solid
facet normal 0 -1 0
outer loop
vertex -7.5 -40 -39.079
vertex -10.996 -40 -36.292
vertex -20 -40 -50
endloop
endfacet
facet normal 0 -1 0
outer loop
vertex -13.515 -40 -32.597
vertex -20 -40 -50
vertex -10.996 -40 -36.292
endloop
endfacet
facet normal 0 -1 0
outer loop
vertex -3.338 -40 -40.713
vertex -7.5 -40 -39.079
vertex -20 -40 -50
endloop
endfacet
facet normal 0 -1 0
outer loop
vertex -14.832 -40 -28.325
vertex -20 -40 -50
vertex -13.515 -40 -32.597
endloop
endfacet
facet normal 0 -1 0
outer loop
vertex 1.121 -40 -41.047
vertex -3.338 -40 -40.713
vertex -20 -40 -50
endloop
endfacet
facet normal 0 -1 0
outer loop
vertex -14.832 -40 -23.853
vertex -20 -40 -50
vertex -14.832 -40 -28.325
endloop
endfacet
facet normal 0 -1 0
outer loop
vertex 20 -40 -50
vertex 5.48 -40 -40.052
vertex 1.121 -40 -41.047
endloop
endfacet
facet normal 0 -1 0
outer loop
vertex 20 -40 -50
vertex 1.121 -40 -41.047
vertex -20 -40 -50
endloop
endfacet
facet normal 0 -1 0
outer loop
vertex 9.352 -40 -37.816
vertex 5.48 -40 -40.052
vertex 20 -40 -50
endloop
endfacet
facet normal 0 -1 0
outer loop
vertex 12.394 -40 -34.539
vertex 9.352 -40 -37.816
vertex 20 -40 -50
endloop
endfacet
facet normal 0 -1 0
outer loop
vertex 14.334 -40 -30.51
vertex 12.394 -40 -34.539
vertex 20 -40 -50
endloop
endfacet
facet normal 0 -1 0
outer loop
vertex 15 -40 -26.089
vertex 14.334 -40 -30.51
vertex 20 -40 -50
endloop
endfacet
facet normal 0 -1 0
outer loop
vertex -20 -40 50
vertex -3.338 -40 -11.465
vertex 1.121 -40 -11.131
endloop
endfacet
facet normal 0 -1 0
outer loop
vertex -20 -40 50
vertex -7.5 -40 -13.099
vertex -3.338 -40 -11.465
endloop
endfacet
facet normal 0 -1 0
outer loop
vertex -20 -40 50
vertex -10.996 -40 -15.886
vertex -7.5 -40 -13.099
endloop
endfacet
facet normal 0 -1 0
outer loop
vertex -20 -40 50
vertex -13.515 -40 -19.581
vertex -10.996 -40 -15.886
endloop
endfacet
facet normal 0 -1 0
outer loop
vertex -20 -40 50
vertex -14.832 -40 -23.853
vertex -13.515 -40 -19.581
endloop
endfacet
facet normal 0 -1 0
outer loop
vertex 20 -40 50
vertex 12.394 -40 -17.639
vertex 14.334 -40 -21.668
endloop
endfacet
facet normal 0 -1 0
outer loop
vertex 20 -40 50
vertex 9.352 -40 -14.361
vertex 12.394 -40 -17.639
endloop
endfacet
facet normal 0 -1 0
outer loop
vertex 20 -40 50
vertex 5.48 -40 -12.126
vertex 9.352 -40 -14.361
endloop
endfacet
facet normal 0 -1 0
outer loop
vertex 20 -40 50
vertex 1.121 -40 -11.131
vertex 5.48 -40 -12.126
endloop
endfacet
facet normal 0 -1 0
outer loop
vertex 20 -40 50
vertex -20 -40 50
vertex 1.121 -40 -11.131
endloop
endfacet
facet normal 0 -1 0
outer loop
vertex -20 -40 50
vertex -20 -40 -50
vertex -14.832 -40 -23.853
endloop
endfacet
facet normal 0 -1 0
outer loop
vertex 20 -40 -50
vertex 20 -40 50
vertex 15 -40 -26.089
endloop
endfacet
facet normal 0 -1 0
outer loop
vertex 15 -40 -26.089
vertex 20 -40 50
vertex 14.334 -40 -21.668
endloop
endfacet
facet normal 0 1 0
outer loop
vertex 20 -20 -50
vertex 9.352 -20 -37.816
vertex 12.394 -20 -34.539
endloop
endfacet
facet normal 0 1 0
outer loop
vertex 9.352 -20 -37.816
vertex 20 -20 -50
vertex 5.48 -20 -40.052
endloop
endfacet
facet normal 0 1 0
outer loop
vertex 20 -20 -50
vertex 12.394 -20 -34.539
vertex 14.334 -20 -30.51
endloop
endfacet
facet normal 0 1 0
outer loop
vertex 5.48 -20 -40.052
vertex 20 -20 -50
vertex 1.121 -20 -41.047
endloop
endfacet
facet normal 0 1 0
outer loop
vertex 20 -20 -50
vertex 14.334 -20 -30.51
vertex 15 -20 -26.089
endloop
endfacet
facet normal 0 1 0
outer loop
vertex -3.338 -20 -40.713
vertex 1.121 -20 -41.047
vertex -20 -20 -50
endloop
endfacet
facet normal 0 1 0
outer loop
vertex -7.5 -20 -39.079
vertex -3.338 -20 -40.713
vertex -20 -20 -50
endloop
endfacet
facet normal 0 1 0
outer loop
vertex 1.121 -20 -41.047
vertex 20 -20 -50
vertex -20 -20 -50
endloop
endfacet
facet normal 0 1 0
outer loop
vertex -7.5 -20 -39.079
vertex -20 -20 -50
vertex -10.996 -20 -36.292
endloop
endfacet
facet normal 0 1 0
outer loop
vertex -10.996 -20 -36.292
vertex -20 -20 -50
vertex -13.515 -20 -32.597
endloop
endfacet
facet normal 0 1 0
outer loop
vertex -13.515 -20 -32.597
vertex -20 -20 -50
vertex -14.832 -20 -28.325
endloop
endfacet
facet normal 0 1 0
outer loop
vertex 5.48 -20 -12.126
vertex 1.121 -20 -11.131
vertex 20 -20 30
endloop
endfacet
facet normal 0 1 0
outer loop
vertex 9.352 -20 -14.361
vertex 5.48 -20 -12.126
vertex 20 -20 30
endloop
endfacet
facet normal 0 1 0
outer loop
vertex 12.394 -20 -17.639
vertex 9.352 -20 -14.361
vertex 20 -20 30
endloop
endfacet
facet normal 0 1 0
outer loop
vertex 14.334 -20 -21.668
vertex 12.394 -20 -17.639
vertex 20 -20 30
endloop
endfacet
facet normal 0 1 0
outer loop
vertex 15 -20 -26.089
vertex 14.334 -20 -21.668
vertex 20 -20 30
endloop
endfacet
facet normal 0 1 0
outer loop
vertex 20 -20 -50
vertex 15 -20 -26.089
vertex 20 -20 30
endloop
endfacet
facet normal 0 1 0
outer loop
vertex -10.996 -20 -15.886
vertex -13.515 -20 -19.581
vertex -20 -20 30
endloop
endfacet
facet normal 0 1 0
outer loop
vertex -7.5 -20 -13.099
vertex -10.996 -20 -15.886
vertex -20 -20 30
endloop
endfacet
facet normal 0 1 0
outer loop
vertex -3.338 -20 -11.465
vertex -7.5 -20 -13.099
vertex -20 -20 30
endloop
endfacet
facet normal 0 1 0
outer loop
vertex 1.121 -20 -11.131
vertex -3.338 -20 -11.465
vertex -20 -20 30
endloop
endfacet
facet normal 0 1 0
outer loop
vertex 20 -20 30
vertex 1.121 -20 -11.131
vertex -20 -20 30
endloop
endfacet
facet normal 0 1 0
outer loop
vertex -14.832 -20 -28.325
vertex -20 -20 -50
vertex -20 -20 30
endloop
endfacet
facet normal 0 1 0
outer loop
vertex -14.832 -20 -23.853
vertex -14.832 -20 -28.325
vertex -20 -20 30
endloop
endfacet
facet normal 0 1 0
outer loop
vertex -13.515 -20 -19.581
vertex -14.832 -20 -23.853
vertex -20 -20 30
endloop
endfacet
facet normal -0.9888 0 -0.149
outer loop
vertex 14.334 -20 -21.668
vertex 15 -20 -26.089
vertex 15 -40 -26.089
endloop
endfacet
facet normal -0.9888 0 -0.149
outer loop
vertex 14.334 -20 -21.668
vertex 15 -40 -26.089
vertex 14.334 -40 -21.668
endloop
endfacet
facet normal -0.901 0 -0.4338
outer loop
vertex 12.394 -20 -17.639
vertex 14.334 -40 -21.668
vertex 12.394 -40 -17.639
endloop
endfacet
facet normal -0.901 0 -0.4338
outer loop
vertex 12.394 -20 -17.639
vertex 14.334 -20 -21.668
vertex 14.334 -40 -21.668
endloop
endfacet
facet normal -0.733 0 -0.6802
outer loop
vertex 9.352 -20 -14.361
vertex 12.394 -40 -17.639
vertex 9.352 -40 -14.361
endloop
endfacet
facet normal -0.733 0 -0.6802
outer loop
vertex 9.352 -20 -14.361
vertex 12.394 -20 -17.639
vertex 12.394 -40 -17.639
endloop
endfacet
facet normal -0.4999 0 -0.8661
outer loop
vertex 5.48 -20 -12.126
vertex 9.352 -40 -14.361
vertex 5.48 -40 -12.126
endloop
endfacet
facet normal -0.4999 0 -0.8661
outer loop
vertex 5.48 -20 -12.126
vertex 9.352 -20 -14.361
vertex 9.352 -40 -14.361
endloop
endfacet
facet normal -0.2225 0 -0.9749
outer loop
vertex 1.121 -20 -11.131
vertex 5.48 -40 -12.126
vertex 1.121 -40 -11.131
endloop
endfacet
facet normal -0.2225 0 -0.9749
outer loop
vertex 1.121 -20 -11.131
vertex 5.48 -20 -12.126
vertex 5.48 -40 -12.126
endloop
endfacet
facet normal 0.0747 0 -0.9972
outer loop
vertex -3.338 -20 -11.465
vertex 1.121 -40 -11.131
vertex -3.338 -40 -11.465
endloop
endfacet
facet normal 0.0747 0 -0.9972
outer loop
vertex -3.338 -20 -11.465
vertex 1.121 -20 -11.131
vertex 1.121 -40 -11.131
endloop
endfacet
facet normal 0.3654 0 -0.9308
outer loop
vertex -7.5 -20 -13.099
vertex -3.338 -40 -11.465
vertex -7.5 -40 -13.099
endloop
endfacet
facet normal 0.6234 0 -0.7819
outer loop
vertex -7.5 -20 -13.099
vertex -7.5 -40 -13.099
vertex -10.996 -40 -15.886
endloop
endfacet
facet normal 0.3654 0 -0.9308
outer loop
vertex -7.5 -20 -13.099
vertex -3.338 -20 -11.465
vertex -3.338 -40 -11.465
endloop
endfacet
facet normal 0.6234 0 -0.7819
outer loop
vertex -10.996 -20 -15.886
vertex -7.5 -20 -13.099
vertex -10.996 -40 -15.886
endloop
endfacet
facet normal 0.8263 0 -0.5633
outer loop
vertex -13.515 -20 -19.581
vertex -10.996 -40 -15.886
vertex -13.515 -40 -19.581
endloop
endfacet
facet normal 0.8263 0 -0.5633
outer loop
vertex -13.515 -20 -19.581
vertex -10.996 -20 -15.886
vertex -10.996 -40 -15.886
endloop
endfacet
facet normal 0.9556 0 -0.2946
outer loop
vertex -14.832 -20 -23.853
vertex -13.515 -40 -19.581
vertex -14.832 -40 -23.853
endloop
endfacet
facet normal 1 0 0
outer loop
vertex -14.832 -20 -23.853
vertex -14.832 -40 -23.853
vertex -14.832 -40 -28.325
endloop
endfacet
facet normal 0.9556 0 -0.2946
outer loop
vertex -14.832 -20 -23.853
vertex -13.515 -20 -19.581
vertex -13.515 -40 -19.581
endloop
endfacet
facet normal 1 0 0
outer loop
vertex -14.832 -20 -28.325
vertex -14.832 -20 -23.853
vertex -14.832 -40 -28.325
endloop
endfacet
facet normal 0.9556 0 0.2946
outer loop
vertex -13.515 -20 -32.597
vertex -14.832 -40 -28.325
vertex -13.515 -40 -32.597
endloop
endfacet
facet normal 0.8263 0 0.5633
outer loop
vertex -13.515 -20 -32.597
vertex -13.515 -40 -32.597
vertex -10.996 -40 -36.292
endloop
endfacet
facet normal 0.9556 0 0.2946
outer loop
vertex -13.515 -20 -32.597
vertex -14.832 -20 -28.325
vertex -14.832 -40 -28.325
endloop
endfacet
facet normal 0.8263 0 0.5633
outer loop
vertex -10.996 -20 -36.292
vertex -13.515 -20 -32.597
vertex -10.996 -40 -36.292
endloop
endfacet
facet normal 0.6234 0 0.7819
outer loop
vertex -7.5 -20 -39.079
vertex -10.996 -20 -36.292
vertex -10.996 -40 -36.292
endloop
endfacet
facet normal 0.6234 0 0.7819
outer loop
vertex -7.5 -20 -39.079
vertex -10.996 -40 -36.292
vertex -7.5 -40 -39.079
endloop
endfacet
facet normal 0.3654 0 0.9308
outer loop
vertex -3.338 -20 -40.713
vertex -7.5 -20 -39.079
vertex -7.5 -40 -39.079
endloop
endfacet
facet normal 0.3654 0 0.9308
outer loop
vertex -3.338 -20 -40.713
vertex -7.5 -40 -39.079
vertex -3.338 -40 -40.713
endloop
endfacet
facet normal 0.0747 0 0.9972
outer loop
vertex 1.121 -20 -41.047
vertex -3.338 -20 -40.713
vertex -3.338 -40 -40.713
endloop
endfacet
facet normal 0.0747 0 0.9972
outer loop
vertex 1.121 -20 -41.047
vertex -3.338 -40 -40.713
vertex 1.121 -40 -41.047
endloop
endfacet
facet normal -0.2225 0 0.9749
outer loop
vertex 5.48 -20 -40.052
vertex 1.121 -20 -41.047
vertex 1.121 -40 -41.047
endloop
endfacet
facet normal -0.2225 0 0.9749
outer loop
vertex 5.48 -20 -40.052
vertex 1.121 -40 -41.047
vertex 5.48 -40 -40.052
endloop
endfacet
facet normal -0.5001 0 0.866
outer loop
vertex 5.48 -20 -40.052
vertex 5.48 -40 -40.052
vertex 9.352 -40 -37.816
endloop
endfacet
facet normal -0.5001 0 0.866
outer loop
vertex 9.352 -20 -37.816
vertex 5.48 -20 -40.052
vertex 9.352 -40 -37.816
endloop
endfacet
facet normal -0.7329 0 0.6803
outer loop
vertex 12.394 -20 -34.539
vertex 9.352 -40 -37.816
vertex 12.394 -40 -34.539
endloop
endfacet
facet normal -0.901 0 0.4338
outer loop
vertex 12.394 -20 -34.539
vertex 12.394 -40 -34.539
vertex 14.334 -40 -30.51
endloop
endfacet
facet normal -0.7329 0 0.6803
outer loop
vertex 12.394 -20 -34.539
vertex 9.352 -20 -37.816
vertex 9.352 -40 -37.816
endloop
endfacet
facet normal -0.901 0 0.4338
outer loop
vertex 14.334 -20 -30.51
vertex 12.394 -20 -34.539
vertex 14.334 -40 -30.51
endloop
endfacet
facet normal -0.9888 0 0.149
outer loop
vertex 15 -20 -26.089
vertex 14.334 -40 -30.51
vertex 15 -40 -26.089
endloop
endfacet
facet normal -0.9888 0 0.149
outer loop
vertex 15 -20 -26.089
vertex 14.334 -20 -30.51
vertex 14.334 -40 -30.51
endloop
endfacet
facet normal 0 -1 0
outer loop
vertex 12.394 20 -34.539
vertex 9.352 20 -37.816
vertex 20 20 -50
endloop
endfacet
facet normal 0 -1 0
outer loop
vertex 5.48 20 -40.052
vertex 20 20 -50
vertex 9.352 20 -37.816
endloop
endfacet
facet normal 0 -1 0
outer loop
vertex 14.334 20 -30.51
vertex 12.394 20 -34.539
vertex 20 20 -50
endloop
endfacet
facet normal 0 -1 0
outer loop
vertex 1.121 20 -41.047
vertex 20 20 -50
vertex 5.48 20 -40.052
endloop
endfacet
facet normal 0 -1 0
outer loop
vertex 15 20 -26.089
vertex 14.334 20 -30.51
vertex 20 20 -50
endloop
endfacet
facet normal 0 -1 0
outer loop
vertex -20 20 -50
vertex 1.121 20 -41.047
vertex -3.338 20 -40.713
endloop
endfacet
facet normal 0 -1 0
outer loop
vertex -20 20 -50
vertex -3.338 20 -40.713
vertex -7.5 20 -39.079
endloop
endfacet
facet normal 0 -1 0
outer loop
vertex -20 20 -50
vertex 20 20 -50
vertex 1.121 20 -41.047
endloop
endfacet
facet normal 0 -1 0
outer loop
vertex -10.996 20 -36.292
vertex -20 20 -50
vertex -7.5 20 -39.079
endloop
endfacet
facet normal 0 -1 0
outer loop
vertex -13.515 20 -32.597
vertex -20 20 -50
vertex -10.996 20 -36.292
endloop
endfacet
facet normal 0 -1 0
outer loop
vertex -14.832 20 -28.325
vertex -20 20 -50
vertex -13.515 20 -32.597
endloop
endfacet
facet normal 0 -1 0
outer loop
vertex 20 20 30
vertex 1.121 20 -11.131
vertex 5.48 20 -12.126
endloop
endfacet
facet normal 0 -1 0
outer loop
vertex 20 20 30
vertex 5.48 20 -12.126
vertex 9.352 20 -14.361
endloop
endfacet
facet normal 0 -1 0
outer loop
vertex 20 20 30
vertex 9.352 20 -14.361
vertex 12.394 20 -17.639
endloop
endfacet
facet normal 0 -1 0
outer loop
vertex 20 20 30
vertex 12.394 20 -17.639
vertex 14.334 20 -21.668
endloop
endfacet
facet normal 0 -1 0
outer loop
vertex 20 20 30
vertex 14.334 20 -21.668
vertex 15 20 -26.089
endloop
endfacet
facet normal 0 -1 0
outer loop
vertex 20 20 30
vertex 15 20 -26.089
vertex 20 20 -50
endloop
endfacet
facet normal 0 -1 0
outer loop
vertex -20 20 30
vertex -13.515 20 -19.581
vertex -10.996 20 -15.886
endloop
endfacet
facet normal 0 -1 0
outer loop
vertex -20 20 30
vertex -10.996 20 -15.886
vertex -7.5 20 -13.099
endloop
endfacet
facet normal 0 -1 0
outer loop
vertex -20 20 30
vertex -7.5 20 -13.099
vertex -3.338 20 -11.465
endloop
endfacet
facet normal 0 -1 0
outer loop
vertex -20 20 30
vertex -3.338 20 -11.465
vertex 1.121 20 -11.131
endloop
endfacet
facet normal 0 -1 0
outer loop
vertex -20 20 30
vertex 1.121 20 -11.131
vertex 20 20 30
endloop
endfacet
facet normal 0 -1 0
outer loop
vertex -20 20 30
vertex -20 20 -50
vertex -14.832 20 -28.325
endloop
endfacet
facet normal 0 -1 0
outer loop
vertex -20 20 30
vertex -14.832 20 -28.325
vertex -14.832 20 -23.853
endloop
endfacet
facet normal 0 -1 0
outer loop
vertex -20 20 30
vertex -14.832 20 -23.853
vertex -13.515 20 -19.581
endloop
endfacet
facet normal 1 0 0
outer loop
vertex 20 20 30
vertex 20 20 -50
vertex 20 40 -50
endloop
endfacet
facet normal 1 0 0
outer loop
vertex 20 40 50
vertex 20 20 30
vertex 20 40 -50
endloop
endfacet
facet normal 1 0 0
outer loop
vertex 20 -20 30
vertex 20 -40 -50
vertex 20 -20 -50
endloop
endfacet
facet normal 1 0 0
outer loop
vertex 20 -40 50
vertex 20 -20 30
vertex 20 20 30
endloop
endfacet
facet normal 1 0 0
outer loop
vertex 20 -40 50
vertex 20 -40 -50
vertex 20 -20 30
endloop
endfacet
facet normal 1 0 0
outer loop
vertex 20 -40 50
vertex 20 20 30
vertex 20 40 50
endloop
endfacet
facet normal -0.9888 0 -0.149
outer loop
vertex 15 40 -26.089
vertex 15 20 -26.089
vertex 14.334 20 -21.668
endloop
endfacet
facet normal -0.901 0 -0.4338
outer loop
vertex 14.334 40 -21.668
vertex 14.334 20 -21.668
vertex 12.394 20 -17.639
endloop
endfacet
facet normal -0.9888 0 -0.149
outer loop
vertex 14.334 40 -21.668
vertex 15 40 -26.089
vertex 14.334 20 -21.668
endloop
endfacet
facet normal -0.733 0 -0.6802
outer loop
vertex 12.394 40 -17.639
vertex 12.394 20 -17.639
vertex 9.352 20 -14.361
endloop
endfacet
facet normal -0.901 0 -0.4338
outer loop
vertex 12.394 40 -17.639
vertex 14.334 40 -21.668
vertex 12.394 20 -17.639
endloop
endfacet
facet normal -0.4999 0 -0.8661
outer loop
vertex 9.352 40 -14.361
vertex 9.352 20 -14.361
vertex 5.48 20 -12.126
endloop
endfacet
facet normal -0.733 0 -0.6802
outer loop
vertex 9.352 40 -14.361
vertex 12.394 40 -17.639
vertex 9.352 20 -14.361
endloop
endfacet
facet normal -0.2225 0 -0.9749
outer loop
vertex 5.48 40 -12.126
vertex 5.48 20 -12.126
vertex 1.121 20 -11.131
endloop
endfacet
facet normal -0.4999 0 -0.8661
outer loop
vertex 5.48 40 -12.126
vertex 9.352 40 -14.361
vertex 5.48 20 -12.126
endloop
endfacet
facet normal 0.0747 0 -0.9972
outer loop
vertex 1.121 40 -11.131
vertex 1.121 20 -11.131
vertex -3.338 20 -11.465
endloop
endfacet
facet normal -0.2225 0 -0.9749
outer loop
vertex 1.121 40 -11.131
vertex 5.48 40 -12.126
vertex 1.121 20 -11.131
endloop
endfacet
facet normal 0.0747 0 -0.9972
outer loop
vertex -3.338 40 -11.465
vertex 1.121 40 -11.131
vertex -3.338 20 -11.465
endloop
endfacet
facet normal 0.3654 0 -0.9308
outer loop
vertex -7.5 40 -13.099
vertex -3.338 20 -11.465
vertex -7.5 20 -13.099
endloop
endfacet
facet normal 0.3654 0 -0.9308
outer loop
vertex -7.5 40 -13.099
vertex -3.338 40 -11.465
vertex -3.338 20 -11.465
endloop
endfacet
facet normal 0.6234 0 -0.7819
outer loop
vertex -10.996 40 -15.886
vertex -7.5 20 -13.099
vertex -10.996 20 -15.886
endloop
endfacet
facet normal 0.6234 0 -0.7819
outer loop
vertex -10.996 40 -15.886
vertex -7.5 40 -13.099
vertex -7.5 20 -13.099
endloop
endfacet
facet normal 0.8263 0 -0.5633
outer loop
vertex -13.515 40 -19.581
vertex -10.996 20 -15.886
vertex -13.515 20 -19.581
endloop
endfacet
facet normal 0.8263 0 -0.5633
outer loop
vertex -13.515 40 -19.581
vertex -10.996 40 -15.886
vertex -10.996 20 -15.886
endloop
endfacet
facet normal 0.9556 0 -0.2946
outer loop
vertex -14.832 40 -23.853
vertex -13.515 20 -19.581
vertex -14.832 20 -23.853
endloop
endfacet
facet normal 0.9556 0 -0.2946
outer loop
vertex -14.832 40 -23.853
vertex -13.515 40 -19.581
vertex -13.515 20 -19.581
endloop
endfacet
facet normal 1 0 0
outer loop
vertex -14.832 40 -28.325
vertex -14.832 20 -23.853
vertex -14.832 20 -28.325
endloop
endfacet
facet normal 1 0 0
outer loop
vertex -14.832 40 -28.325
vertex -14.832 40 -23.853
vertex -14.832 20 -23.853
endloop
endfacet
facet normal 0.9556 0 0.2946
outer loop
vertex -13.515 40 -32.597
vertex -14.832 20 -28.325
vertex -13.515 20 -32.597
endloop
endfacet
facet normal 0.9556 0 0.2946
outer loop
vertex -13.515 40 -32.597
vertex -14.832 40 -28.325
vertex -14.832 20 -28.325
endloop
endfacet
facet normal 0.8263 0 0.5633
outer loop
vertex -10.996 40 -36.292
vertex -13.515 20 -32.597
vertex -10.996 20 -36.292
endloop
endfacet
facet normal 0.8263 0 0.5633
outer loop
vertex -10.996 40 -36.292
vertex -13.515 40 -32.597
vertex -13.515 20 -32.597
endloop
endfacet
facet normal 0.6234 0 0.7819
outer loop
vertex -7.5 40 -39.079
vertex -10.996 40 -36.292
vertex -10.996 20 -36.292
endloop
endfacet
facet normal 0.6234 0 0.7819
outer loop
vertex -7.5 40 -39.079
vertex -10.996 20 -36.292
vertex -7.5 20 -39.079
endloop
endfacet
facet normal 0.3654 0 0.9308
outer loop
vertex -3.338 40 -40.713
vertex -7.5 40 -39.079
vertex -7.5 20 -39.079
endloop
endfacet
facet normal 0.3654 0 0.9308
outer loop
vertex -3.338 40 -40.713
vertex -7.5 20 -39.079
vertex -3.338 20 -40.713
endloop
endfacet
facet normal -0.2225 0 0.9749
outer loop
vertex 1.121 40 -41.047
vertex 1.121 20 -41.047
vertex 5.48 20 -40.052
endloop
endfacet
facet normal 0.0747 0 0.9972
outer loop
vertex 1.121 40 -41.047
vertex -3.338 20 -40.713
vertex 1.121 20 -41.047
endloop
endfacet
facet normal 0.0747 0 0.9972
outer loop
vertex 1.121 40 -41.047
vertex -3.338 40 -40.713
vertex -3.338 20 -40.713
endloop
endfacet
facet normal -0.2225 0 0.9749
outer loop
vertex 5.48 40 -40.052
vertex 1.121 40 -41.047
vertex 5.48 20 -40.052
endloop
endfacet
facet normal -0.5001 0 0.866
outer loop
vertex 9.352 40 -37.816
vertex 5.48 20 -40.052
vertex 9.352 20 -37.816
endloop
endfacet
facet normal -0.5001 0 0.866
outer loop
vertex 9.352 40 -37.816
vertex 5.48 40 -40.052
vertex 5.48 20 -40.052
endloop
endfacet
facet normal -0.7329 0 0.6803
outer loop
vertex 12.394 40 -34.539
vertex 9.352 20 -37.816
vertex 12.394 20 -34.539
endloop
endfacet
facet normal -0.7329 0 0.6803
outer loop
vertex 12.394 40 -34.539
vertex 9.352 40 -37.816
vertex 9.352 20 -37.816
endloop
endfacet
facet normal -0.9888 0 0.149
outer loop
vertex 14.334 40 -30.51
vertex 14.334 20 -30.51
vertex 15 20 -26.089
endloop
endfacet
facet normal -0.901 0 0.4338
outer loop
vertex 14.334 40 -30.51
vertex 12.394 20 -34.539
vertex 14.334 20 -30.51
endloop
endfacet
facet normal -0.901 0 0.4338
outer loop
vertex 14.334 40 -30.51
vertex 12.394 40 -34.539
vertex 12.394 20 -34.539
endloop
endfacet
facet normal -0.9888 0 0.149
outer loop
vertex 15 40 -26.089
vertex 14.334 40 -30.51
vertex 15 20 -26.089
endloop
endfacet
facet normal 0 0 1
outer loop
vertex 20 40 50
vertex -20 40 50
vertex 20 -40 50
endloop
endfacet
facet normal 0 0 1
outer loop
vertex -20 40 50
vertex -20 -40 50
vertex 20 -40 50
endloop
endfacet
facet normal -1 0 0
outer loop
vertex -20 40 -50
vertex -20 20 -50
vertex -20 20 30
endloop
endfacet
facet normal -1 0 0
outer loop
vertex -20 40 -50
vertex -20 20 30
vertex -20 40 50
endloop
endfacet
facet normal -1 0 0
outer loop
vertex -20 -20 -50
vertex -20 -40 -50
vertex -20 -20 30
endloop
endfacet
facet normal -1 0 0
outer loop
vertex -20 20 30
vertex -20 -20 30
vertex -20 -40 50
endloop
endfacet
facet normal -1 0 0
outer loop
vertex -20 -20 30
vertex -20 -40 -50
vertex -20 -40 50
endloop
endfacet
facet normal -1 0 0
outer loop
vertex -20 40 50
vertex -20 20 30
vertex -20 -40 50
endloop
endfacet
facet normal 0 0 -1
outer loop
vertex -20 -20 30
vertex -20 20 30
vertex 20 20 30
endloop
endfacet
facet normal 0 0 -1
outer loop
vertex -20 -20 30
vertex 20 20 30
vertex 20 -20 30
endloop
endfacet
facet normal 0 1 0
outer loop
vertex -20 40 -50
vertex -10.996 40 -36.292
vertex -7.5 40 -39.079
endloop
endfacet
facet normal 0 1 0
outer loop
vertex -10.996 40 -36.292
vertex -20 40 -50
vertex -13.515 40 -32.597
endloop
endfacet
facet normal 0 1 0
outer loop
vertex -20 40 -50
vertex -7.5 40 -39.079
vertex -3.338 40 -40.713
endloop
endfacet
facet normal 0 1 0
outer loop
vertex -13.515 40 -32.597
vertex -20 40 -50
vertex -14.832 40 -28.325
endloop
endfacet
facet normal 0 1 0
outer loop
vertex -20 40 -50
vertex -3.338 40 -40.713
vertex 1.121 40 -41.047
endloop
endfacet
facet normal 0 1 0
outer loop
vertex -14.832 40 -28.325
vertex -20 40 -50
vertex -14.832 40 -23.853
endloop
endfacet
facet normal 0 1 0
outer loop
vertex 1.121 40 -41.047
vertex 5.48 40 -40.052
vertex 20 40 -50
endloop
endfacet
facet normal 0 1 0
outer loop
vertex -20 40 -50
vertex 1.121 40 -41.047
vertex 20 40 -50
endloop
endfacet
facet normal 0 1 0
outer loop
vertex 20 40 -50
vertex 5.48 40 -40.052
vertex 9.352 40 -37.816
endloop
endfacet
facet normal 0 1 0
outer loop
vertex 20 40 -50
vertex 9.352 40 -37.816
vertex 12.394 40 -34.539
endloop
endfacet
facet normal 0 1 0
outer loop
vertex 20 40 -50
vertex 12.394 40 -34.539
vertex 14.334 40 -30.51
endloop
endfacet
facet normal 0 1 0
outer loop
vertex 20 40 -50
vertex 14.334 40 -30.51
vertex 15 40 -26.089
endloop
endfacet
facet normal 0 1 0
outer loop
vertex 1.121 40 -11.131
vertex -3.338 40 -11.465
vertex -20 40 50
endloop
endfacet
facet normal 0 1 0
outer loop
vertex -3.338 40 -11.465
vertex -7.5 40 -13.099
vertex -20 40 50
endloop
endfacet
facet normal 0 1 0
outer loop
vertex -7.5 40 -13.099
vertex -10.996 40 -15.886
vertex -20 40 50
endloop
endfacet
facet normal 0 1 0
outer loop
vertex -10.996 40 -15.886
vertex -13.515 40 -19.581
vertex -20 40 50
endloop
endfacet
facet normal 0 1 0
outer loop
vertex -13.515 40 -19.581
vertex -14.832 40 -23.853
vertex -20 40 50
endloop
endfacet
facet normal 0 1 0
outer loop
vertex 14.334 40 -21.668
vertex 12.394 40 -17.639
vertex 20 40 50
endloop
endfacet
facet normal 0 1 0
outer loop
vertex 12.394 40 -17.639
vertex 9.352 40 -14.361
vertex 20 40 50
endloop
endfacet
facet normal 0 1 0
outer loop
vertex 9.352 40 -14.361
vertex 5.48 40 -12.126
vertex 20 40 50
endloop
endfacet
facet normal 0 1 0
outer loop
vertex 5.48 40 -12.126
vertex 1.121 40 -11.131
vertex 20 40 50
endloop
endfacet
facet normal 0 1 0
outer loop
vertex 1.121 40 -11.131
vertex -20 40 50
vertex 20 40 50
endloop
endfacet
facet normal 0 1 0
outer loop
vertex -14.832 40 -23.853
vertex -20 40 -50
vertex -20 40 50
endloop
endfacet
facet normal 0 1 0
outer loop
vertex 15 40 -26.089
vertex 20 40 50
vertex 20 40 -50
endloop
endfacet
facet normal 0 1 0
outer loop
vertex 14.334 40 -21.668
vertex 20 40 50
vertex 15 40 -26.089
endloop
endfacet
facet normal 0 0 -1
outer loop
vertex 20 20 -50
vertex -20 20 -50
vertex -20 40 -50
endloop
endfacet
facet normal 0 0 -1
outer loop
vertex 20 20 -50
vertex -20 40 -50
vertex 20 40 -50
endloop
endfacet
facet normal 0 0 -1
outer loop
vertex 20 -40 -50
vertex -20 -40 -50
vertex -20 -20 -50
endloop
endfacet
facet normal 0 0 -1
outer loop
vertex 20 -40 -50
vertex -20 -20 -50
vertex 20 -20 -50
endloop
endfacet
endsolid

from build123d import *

# Parameters (mm, degrees)
F0_W     = 40
F0_H     = 100
F0_R     = 15
F1_DEPTH = 40
F2_W     = 40
F2_H     = 80
F3_DEPTH = 60


with BuildPart() as f1:
    # F0 (on Front) → F1 (new body, symmetric)
    with BuildSketch(Plane.XZ):
        Rectangle(F0_W, F0_H)
        with Locations((0, -26.0889567435)):
            Circle(F0_R, mode=Mode.SUBTRACT)
    extrude(amount=F1_DEPTH, both=True)

    # F2 (on face) → F3 (cut, symmetric)
    with BuildSketch(Plane(origin=(-20, 0, 0), x_dir=(0, -1, 0), z_dir=(-1, 0, 0))):
        with Locations((0, -10)):
            Rectangle(F2_W, F2_H)
    extrude(amount=F3_DEPTH, both=True, mode=Mode.SUBTRACT)


solid = f1.part
